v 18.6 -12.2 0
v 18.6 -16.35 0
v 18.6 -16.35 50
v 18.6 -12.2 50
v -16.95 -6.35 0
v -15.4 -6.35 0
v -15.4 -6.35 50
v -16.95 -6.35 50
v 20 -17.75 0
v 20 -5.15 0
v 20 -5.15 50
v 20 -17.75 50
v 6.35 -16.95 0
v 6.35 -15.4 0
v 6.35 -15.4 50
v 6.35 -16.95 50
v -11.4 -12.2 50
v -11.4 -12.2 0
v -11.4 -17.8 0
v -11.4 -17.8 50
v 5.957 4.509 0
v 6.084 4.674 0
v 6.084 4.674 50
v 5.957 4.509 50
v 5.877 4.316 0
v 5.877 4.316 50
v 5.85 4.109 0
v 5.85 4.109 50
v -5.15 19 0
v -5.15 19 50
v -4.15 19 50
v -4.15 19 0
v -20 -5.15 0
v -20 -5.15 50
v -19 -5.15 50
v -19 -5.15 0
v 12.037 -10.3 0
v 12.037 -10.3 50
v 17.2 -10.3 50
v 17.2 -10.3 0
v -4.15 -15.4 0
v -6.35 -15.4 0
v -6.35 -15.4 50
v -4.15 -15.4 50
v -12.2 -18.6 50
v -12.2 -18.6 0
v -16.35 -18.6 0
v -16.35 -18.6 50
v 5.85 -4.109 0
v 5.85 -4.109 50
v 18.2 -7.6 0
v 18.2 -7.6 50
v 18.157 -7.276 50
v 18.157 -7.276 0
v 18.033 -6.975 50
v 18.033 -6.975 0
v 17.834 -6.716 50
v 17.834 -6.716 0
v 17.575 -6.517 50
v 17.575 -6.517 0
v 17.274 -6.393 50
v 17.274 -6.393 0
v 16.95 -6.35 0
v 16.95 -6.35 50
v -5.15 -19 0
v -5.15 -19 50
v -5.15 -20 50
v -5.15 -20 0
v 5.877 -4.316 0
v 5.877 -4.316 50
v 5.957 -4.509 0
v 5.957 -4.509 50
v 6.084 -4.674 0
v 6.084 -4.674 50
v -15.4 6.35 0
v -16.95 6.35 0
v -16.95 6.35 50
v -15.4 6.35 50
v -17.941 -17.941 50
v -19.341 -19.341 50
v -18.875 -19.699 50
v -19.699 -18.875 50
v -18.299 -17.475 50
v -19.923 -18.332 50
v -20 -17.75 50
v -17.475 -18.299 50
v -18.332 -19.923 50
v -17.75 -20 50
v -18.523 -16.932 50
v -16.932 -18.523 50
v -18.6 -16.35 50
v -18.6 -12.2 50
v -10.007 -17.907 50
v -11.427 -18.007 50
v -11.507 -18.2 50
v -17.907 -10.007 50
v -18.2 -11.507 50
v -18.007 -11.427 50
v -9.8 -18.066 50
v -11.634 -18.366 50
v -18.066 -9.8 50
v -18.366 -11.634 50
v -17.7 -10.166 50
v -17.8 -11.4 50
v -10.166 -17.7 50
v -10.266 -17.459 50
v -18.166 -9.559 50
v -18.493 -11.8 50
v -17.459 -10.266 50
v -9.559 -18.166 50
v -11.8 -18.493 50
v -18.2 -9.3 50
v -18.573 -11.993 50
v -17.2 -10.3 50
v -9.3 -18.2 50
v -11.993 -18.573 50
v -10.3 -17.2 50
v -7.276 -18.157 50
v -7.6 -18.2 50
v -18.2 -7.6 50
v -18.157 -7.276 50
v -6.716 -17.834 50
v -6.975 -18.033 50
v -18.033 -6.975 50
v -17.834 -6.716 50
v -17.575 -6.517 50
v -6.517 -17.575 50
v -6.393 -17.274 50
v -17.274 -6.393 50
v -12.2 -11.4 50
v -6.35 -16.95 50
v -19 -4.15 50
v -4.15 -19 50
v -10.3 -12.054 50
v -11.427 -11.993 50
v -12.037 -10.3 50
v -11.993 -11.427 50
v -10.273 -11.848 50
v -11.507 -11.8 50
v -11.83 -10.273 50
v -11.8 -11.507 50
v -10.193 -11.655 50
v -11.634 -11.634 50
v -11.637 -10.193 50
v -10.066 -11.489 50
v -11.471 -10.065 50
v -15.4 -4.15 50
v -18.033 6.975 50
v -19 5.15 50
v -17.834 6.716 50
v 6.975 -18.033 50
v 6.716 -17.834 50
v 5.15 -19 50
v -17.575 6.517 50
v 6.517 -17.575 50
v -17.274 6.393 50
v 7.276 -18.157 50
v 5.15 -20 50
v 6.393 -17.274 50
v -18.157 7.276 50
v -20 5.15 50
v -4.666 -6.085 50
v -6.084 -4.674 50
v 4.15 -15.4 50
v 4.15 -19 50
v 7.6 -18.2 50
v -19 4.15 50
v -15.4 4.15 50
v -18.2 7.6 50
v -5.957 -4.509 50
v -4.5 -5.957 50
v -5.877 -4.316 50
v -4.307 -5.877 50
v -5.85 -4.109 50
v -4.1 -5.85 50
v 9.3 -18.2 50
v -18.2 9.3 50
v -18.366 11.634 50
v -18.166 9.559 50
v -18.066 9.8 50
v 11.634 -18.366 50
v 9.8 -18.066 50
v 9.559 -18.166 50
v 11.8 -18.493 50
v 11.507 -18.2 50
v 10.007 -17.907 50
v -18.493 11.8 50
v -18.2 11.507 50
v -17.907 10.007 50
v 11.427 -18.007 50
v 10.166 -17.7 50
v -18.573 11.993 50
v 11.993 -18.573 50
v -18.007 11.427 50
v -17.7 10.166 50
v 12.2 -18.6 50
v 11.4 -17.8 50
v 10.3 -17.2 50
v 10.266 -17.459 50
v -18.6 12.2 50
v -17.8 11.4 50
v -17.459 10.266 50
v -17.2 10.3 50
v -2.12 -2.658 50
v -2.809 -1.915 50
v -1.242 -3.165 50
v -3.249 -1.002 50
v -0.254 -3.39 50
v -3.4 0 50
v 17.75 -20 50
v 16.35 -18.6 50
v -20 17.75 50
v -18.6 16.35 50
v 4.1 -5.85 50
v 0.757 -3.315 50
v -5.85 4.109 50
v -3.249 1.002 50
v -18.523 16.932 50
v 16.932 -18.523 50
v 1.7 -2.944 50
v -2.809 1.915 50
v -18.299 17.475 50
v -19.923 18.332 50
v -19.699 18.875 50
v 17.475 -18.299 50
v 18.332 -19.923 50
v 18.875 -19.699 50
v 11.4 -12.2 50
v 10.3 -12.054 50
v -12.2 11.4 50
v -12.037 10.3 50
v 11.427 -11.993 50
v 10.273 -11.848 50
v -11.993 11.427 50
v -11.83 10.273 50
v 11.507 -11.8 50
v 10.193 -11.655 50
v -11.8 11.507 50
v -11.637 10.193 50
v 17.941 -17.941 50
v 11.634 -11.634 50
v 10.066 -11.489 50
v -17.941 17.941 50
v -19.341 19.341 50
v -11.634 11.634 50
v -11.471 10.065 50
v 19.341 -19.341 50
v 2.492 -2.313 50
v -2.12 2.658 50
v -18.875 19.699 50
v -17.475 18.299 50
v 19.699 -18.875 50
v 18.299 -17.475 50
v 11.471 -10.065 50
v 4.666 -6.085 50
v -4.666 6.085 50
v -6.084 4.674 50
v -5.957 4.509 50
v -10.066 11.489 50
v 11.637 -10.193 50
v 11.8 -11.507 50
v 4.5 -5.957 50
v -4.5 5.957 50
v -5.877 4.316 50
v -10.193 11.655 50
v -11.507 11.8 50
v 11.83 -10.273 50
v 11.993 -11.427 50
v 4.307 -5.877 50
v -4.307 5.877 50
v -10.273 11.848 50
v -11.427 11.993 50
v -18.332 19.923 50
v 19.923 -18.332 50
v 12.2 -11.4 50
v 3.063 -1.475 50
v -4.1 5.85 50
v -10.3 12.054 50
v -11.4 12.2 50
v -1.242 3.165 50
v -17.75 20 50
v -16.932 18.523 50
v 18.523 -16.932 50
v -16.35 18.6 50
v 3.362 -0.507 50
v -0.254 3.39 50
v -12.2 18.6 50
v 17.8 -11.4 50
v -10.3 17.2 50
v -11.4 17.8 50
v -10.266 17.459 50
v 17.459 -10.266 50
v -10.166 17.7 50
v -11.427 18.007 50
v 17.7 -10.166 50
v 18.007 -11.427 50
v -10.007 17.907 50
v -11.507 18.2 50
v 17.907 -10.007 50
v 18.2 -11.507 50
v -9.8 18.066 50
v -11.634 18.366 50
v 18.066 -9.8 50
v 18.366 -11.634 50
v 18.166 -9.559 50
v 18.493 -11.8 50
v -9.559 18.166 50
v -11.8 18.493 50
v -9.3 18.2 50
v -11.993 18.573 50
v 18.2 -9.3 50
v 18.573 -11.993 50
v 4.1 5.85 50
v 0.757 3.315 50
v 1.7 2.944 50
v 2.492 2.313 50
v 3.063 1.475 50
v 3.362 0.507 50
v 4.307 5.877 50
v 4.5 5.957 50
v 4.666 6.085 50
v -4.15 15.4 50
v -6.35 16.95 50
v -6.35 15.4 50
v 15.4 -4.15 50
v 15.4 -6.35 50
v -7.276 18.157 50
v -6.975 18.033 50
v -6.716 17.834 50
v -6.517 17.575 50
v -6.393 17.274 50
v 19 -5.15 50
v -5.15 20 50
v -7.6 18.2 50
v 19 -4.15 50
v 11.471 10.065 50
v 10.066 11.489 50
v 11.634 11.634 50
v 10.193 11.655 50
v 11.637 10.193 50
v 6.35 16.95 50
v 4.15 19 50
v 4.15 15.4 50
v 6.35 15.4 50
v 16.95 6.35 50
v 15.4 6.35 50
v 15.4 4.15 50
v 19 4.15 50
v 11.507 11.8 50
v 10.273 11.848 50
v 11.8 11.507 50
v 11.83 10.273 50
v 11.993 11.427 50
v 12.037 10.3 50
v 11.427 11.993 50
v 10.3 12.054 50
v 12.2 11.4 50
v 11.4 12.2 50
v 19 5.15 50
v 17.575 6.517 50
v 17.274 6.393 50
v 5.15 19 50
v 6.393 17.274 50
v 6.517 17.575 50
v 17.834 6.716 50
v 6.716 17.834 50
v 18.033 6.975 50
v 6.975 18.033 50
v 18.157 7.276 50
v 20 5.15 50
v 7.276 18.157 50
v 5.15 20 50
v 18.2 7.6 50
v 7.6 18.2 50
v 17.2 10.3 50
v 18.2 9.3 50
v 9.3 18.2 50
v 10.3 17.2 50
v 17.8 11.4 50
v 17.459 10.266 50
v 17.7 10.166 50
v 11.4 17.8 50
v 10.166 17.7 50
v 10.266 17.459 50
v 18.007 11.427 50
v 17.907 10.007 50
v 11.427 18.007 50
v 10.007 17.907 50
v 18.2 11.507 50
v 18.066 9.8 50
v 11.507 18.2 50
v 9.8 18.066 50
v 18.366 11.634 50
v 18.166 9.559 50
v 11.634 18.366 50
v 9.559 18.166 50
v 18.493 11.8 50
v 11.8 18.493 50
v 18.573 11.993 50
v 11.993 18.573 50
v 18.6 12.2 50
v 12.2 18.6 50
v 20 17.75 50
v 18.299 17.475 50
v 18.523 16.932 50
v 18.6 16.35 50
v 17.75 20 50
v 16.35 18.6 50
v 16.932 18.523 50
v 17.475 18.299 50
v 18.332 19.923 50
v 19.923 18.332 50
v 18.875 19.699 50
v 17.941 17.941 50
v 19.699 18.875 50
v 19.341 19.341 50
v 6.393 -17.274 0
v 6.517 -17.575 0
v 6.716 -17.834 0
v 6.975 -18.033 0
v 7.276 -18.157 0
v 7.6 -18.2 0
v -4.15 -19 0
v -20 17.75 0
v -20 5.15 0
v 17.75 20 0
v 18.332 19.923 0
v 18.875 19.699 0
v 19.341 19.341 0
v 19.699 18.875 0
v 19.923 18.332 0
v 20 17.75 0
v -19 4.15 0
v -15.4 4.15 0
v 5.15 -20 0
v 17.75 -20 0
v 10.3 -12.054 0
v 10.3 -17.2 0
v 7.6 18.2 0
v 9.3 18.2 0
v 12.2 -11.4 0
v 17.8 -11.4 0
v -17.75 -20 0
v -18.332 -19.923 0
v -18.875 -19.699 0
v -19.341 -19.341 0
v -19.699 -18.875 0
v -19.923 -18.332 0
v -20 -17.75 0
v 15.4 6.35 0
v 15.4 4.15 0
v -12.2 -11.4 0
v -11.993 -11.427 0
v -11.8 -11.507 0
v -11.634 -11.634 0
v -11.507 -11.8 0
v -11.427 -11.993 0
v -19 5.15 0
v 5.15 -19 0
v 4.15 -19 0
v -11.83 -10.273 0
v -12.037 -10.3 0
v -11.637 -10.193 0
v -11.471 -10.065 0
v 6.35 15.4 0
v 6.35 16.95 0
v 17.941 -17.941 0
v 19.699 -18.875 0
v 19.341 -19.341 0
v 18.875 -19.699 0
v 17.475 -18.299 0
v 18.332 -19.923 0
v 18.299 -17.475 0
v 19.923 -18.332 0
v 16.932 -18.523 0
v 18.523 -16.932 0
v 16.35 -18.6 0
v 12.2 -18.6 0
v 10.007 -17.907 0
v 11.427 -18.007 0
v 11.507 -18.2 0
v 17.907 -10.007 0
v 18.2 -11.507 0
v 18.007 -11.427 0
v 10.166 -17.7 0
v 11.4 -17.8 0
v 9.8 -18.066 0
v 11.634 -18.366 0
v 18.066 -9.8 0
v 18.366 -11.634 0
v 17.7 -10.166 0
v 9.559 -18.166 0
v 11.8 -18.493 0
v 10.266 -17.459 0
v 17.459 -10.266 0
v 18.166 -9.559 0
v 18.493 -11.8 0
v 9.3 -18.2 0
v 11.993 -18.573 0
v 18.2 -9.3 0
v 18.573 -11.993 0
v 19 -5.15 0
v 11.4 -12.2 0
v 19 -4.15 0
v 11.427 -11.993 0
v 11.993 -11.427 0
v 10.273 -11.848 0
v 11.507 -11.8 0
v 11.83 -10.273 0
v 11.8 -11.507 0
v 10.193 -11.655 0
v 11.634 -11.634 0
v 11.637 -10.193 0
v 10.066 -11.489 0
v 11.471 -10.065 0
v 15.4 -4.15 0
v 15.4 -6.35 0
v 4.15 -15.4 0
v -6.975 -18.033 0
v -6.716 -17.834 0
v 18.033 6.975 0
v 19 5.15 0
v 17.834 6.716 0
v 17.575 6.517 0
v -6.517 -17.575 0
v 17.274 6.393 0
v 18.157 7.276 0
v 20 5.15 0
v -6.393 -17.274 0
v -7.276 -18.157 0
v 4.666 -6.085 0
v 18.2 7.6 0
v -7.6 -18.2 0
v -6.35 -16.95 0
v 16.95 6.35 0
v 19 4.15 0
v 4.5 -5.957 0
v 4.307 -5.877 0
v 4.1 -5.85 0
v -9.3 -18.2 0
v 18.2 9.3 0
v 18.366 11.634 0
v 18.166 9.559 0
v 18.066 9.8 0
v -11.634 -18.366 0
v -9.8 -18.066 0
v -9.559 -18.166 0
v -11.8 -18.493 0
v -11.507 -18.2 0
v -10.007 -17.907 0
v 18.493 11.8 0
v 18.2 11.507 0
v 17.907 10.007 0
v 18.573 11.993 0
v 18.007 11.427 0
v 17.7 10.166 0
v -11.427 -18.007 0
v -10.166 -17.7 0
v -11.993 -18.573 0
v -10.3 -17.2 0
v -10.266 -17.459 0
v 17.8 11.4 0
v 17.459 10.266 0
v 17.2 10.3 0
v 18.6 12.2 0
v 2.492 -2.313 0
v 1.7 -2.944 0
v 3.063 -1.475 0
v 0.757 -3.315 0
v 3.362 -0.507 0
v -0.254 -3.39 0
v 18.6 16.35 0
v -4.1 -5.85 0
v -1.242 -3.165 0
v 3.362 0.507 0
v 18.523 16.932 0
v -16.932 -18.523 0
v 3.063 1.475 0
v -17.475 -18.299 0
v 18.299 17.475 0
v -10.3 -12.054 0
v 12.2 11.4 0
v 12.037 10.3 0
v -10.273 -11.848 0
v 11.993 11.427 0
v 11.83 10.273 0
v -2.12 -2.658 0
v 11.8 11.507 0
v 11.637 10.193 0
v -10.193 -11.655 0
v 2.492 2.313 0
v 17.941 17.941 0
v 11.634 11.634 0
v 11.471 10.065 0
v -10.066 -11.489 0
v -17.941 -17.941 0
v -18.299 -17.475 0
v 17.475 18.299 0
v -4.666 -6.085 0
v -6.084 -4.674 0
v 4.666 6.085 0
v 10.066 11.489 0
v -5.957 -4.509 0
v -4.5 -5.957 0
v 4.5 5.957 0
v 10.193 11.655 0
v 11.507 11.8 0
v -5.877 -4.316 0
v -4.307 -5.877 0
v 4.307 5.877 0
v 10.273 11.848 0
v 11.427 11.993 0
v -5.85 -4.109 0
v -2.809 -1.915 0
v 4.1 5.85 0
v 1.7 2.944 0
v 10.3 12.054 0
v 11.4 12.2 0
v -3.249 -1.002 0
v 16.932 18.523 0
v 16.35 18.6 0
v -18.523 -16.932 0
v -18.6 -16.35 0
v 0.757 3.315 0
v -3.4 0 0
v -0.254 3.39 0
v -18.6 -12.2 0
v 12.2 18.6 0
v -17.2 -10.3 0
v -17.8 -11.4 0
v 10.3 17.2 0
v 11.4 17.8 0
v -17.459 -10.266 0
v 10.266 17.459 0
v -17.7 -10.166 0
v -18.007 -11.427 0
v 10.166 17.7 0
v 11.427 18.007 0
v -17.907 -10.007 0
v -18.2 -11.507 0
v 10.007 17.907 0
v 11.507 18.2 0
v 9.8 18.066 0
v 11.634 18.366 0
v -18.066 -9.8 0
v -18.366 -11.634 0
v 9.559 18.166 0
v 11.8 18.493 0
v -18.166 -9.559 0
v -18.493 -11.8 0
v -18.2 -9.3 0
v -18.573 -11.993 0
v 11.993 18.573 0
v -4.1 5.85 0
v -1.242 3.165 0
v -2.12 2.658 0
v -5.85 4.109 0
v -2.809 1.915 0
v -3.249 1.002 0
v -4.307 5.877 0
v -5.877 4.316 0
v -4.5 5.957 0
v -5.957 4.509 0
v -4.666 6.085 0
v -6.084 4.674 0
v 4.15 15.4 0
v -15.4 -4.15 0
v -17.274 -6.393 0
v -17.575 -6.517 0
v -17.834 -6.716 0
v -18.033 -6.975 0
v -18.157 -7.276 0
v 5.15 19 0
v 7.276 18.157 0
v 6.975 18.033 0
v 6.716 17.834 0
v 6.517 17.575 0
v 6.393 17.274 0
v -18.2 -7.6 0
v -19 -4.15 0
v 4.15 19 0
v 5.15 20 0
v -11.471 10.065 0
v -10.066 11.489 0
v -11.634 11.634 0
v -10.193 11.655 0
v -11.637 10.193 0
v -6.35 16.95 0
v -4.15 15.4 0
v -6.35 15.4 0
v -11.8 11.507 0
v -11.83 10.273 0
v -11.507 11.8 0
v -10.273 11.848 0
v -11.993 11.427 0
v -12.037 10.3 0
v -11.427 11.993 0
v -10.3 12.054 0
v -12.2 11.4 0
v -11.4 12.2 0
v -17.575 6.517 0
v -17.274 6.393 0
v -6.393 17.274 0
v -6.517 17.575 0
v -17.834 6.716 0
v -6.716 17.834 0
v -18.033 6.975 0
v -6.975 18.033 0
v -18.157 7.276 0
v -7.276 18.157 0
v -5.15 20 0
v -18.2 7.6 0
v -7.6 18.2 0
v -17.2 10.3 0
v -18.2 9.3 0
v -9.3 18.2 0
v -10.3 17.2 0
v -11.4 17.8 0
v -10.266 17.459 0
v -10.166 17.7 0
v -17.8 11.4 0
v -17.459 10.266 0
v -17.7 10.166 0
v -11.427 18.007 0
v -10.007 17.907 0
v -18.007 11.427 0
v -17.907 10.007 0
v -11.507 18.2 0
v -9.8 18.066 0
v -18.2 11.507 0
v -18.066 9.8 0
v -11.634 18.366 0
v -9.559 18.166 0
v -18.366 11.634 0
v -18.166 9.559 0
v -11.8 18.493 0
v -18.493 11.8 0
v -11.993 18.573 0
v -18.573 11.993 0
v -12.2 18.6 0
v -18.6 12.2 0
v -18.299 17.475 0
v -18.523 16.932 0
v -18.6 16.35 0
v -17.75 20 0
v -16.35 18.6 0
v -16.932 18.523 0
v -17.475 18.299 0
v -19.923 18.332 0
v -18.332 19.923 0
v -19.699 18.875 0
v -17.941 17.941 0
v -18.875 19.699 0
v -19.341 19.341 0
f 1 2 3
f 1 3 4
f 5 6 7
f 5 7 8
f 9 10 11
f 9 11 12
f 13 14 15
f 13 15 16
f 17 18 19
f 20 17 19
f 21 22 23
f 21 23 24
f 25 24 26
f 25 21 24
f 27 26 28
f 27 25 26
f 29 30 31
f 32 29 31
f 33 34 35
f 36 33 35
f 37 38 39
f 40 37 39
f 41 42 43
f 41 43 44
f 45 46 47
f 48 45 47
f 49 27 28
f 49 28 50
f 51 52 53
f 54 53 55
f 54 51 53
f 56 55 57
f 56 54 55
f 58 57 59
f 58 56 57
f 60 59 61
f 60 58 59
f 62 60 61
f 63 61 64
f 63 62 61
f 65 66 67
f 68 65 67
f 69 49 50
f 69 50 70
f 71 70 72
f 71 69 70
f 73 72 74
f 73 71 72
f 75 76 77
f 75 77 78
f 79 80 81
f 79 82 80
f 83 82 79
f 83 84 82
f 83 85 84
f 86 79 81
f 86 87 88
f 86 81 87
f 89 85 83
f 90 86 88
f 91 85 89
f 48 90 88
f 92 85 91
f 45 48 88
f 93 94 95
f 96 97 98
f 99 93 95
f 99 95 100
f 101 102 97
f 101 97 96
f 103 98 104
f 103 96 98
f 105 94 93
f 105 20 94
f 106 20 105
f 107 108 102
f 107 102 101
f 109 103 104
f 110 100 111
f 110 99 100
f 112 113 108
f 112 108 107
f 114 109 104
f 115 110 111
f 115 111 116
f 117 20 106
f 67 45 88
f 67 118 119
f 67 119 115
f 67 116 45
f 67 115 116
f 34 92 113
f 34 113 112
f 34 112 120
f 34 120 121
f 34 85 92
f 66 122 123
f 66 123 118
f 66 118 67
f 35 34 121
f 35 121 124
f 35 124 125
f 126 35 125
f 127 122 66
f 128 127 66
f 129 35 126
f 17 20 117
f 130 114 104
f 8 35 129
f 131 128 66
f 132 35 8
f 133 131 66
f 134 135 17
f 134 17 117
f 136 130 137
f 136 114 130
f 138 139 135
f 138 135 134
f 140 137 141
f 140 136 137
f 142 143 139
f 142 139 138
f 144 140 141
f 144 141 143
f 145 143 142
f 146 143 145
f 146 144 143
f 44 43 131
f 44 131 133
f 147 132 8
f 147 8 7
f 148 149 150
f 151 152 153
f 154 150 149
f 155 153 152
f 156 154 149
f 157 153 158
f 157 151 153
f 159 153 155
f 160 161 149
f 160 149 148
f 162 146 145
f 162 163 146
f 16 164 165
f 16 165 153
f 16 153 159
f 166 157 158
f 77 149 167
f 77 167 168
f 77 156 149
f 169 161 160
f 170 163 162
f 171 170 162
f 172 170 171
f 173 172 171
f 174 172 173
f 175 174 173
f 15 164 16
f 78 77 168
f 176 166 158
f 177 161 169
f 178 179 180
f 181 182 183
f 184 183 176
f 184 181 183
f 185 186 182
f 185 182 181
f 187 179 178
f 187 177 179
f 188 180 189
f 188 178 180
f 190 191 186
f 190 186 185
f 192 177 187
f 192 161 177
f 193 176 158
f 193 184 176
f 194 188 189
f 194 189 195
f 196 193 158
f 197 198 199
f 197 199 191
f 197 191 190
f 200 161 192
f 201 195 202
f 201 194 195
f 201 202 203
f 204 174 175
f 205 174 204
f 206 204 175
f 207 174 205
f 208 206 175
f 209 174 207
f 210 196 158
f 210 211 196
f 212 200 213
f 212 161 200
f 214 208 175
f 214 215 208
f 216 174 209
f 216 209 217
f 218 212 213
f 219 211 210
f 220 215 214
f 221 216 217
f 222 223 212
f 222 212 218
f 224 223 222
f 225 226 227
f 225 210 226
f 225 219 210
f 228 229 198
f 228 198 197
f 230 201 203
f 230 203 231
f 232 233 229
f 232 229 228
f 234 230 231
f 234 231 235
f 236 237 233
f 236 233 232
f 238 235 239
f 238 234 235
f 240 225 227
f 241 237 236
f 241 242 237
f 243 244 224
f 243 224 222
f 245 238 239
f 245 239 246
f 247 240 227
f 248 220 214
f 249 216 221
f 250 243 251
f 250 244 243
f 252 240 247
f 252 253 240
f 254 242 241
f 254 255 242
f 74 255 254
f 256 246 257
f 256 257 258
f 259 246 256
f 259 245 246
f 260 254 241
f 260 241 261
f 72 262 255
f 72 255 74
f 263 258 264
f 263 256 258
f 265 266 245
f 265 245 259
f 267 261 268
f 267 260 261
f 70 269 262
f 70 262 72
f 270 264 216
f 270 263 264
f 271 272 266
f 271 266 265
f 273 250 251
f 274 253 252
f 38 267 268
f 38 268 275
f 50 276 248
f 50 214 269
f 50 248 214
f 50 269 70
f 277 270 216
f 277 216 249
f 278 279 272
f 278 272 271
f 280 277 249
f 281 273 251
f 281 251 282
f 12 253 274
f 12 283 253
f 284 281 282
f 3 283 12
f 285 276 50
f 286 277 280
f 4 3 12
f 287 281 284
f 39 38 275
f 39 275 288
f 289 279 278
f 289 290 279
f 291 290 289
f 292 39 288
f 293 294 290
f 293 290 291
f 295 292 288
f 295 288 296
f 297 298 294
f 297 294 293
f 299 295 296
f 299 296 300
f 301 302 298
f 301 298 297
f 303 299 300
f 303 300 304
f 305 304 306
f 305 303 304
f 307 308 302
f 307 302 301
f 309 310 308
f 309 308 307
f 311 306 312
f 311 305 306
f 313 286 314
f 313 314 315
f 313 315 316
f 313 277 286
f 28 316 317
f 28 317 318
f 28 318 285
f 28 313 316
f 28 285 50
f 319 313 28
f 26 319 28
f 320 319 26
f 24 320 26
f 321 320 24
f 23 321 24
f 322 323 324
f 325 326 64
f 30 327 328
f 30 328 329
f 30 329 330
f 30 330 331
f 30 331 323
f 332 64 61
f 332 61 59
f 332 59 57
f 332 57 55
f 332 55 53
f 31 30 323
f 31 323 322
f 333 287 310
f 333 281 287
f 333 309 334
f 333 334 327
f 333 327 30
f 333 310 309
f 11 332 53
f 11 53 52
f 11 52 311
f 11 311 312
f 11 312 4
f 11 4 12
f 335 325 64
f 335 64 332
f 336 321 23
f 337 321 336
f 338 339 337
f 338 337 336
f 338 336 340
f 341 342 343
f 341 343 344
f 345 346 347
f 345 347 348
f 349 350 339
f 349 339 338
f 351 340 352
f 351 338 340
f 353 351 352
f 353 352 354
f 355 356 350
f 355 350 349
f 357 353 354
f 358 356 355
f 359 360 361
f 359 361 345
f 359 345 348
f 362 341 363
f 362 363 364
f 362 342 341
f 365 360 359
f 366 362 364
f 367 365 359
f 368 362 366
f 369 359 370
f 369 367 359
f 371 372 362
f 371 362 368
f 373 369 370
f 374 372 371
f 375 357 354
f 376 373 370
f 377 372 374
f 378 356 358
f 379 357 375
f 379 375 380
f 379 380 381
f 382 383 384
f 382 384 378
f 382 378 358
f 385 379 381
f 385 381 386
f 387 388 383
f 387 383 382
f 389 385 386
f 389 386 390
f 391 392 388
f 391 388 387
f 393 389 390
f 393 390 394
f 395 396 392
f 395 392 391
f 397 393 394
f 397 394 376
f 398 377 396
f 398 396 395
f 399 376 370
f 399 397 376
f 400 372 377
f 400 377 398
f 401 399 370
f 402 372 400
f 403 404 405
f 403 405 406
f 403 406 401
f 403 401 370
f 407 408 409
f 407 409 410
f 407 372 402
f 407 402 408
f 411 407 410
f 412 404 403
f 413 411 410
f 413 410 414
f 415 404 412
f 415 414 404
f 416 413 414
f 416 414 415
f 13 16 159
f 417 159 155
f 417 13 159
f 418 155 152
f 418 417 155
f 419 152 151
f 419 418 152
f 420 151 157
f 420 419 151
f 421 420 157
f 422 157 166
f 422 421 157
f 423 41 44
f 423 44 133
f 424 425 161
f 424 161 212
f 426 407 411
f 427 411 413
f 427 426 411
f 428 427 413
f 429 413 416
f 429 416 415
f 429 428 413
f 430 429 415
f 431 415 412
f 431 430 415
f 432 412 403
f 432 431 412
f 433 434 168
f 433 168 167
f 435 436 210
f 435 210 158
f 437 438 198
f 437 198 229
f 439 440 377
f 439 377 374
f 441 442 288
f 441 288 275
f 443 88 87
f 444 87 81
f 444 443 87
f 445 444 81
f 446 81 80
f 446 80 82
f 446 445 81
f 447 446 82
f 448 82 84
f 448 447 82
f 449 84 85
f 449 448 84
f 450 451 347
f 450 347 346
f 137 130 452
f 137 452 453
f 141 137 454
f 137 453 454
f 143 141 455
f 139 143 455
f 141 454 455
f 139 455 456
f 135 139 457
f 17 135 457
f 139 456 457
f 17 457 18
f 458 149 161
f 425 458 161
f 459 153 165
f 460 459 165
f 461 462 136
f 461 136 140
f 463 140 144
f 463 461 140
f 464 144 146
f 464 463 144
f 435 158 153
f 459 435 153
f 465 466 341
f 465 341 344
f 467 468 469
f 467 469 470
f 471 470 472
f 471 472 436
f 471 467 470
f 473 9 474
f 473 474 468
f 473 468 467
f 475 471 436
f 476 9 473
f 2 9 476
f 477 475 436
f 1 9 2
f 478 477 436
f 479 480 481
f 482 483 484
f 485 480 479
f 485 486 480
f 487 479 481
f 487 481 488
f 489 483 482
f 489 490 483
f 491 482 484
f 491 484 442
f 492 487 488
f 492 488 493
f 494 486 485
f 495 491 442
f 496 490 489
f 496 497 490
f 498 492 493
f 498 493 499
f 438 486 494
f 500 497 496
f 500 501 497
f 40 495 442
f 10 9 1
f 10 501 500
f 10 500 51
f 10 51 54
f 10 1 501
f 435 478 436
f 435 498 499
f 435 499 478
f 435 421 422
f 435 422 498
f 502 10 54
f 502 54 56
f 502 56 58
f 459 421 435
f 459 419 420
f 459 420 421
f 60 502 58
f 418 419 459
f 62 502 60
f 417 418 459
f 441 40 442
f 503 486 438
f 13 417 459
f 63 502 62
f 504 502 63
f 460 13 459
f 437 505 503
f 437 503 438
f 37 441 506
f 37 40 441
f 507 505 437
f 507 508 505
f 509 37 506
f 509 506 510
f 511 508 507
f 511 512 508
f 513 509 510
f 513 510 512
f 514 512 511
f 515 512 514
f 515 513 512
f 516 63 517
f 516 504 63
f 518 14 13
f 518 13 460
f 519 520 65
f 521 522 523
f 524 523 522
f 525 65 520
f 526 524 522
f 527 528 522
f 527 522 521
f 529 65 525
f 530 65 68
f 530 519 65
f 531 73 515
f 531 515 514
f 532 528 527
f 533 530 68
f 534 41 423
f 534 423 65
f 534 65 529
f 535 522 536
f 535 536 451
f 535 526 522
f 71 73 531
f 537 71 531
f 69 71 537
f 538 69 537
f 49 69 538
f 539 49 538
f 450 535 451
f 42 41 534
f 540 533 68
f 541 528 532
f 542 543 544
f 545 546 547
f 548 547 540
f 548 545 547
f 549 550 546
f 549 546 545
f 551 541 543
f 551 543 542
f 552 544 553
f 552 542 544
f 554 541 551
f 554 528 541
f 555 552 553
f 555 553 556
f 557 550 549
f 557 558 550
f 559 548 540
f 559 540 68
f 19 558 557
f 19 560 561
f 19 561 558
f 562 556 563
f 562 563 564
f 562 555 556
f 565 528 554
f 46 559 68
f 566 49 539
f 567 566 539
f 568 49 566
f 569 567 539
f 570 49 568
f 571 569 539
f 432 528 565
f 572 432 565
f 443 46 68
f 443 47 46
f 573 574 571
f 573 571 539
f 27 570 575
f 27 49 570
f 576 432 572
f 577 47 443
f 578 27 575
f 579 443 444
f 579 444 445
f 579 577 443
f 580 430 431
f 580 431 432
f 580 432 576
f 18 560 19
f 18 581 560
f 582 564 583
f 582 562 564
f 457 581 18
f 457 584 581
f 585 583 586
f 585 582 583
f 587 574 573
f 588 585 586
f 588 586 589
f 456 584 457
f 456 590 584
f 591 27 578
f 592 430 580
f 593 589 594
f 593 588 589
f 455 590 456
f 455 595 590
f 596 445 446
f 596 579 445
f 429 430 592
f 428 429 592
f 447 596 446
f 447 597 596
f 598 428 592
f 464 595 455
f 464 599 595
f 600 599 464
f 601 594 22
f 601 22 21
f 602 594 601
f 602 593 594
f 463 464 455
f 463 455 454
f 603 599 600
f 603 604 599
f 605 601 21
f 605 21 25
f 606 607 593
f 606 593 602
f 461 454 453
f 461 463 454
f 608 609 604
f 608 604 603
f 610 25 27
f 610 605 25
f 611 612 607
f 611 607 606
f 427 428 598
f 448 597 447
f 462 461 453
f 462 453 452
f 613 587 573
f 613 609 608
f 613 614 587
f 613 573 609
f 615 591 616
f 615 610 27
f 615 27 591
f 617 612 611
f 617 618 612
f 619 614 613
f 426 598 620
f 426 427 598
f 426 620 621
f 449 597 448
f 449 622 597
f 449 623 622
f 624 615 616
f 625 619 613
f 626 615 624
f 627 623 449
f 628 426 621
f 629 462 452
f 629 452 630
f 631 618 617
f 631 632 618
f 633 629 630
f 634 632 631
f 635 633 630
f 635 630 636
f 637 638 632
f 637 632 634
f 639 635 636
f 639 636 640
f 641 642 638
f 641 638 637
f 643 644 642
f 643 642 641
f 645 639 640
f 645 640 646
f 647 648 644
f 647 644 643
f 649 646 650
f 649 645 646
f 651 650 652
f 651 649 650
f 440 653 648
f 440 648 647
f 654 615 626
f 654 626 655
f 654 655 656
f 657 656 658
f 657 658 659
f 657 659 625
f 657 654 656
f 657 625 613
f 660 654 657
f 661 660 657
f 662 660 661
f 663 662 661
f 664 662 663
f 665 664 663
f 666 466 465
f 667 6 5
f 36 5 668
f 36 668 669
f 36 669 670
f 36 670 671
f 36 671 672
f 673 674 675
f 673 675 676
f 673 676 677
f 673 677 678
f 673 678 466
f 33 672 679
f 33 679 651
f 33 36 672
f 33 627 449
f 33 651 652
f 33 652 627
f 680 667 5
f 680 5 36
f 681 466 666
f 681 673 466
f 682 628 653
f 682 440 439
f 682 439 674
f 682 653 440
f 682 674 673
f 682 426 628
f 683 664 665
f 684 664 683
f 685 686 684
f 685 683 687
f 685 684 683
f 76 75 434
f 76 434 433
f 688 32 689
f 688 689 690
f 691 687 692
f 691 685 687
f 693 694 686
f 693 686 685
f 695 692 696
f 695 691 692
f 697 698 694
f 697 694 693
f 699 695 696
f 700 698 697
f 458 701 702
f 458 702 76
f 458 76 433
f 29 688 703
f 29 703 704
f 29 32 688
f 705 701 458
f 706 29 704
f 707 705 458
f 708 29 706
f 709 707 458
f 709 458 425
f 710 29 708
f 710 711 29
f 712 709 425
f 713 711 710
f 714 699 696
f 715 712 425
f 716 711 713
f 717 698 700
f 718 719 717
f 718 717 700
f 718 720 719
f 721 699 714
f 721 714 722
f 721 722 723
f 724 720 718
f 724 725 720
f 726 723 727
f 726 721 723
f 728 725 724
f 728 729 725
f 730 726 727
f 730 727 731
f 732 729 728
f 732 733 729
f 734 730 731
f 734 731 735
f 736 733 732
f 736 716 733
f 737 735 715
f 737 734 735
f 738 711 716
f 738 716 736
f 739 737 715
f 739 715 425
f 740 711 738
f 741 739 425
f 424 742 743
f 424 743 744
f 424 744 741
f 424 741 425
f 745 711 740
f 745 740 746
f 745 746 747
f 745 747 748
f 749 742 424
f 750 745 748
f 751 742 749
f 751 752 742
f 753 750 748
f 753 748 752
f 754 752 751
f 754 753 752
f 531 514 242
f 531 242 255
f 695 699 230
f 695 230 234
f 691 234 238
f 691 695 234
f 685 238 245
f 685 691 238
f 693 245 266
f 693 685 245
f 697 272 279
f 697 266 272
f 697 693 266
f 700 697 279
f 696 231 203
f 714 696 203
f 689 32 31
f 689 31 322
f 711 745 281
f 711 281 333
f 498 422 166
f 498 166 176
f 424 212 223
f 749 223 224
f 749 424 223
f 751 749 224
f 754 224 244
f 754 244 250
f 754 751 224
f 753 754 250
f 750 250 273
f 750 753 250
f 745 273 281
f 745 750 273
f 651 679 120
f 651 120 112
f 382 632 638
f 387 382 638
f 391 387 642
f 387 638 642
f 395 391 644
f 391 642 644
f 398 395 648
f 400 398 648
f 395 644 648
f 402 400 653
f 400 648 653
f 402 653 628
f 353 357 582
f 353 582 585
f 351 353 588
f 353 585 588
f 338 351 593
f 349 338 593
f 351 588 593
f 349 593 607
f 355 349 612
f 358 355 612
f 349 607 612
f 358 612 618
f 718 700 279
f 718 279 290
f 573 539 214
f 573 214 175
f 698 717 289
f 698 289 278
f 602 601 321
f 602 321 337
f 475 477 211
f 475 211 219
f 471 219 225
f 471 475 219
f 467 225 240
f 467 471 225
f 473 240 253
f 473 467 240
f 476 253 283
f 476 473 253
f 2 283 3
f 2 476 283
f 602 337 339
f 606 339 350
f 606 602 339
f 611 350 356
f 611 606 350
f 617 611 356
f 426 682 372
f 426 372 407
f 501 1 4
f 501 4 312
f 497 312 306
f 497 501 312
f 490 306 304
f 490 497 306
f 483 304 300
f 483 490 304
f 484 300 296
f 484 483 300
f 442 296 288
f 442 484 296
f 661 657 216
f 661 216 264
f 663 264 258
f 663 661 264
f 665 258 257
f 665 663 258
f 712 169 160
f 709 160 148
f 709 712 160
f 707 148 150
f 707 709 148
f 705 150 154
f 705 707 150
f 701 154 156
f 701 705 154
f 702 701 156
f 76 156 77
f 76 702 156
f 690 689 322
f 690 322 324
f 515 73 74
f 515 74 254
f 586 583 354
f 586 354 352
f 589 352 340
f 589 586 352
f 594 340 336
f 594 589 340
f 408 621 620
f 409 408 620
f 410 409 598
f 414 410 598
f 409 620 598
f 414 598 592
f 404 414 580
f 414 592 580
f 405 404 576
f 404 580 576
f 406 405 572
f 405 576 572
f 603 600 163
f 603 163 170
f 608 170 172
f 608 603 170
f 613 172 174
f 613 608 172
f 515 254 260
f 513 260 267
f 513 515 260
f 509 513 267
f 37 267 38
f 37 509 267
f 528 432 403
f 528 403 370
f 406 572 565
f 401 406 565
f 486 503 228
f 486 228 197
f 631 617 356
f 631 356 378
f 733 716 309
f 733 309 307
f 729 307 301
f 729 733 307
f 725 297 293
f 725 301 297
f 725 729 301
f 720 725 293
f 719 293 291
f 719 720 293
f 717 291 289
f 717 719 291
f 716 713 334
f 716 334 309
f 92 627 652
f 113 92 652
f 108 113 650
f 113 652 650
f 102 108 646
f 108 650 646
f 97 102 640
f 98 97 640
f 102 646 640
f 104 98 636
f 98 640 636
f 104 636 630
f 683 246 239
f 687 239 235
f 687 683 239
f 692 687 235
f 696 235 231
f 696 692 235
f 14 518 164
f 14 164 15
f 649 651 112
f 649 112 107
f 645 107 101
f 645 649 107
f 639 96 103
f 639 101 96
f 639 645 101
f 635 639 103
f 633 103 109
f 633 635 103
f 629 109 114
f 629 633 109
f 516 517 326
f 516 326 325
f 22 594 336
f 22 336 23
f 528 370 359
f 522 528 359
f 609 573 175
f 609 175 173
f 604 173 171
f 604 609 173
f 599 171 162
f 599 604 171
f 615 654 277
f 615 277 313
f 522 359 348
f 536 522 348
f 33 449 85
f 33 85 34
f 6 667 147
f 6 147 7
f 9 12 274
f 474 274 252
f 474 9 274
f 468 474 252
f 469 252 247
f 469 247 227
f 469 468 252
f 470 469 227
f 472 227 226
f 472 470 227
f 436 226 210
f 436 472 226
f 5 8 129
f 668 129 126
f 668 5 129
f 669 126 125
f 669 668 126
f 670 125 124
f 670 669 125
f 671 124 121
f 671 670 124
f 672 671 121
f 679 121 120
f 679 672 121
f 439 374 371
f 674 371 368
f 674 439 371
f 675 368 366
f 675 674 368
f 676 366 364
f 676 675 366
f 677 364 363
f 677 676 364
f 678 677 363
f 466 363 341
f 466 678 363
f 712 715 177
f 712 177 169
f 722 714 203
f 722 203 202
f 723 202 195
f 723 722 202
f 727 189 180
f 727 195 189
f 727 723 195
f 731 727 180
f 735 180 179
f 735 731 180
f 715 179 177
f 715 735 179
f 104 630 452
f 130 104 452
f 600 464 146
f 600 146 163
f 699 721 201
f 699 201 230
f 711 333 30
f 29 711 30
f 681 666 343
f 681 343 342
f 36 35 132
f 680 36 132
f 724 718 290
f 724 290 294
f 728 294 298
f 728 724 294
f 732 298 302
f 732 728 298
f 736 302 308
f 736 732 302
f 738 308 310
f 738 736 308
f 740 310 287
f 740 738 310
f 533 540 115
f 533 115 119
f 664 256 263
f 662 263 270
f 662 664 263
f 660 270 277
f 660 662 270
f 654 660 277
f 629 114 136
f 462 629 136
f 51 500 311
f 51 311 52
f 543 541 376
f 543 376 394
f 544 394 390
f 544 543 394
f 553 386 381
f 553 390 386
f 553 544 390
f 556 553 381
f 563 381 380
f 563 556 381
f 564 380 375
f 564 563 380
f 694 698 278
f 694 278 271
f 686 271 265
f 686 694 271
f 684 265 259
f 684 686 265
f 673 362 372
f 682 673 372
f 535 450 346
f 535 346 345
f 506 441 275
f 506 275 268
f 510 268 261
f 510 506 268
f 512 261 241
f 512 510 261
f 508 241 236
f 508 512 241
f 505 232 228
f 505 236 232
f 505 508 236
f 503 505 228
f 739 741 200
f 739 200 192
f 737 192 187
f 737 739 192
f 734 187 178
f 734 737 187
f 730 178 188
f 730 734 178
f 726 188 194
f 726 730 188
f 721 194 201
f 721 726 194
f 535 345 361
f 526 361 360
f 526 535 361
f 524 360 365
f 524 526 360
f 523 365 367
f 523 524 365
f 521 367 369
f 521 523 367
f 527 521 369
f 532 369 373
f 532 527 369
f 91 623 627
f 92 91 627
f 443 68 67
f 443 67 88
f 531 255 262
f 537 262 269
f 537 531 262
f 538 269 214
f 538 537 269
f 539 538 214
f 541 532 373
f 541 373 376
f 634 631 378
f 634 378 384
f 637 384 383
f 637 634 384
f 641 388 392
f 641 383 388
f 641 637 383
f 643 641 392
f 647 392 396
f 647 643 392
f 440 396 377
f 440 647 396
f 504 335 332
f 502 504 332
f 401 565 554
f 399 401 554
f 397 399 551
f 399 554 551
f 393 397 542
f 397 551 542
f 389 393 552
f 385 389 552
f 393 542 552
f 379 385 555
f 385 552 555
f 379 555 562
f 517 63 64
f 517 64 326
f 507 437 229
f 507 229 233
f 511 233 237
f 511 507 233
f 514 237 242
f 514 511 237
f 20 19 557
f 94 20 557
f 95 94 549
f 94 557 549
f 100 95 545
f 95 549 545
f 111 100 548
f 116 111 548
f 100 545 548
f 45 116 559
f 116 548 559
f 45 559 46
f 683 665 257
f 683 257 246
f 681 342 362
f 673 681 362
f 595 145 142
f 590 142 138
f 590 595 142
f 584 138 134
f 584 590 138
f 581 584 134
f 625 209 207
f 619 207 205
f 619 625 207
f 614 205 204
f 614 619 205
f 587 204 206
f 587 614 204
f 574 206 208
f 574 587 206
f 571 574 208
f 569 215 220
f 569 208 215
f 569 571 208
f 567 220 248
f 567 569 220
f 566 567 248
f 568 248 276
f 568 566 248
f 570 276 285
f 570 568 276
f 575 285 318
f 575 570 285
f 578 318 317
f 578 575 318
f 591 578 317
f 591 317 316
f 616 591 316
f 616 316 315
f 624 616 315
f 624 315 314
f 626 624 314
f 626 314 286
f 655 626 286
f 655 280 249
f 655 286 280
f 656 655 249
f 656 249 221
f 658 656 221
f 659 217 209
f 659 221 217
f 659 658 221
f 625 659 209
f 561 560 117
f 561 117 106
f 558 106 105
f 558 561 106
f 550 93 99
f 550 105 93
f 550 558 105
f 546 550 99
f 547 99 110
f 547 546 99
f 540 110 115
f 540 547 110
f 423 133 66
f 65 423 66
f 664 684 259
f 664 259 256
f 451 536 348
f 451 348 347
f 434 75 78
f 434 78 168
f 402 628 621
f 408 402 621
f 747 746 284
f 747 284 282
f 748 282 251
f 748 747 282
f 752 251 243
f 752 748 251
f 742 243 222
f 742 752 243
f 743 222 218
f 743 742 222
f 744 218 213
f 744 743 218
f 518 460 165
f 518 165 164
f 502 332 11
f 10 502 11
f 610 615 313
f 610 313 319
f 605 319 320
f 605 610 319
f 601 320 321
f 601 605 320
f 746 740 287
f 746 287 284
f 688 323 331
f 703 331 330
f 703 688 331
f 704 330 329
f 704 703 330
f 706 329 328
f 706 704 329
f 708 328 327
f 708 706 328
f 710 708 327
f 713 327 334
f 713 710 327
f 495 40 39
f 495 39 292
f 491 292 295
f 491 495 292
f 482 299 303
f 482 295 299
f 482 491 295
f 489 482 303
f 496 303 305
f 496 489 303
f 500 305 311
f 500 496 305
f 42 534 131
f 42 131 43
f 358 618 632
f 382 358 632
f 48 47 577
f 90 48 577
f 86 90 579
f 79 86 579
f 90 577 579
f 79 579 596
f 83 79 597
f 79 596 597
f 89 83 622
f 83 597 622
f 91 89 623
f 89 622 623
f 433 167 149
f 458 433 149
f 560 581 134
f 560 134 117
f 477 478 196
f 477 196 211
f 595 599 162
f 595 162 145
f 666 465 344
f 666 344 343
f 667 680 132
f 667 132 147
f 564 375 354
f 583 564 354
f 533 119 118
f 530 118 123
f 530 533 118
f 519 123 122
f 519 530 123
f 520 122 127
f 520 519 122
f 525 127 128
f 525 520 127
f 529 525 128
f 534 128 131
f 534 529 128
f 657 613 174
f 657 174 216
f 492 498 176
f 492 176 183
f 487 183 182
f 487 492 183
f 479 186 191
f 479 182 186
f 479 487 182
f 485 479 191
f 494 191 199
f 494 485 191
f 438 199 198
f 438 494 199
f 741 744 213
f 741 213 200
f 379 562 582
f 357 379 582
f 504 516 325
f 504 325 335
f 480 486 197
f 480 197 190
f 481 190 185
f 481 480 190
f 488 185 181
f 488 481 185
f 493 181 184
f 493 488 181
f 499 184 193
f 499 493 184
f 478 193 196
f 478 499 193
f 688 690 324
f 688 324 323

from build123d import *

# Parameters (mm, degrees)
SKETCH1_R           = 3.4
BOSS_EXTRUDE1_DEPTH = 713
SKETCH2_W           = 40
SKETCH2_H           = 113
CUT_EXTRUDE1_DEPTH  = 715.401147815
SKETCH3_W           = 40
SKETCH3_H           = 550
CUT_EXTRUDE2_DEPTH  = 602.66435826


with BuildPart() as part:
    # Sketch1 → Boss-Extrude1 (new body)
    with BuildSketch(Plane.XY):
        with BuildLine():
            Line((20, 17.75), (20, 5.15))
            Line((20, 5.15), (19, 5.15))
            Line((19, 5.15), (19, 4.15))
            Line((19, 4.15), (15.4, 4.15))
            Line((15.4, 4.15), (15.4, 6.35))
            Line((15.4, 6.35), (16.95, 6.35))
            ThreePointArc((16.95, 6.35), (17.833883476, 6.716116524), (18.2, 7.6))
            Line((18.2, 7.6), (18.2, 9.3))
            ThreePointArc((18.2, 9.3), (17.907106781, 10.007106781), (17.2, 10.3))
            Line((17.2, 10.3), (12.03669957, 10.3))
            ThreePointArc((12.03669957, 10.3), (11.73040037, 10.239040459), (11.470780817, 10.065452001))
            Line((11.470780817, 10.065452001), (6.084081247, 4.674305984))
            ThreePointArc((6.084081247, 4.674305984), (5.910833239, 4.414848262), (5.85, 4.108853983))
            Line((5.85, 4.108853983), (5.85, -4.108853983))
            ThreePointArc((5.85, -4.108853983), (5.910833239, -4.414848262), (6.084081247, -4.674305984))
            Line((6.084081247, -4.674305984), (11.470780817, -10.065452001))
            ThreePointArc((11.470780817, -10.065452001), (11.73040037, -10.239040459), (12.03669957, -10.3))
            Line((12.03669957, -10.3), (17.2, -10.3))
            ThreePointArc((17.2, -10.3), (17.907106781, -10.007106781), (18.2, -9.3))
            Line((18.2, -9.3), (18.2, -7.6))
            ThreePointArc((18.2, -7.6), (17.833883476, -6.716116524), (16.95, -6.35))
            Line((16.95, -6.35), (15.4, -6.35))
            Line((15.4, -6.35), (15.4, -4.15))
            Line((15.4, -4.15), (19, -4.15))
            Line((19, -4.15), (19, -5.15))
            Line((19, -5.15), (20, -5.15))
            Line((20, -5.15), (20, -17.75))
            ThreePointArc((20, -17.75), (19.340990258, -19.340990258), (17.75, -20))
            Line((17.75, -20), (5.15, -20))
            Line((5.15, -20), (5.15, -19))
            Line((5.15, -19), (4.15, -19))
            Line((4.15, -19), (4.15, -15.4))
            Line((4.15, -15.4), (6.35, -15.4))
            Line((6.35, -15.4), (6.35, -16.95))
            ThreePointArc((6.35, -16.95), (6.716116524, -17.833883476), (7.6, -18.2))
            Line((7.6, -18.2), (9.3, -18.2))
            ThreePointArc((9.3, -18.2), (10.007106781, -17.907106781), (10.3, -17.2))
            Line((10.3, -17.2), (10.3, -12.054477022))
            ThreePointArc((10.3, -12.054477022), (10.239166761, -11.748482743), (10.065918753, -11.489025021))
            Line((10.065918753, -11.489025021), (4.665899173, -6.084547999))
            ThreePointArc((4.665899173, -6.084547999), (4.406279619, -5.910959541), (4.09998042, -5.85))
            Line((4.09998042, -5.85), (-4.09998042, -5.85))
            ThreePointArc((-4.09998042, -5.85), (-4.406279619, -5.910959541), (-4.665899173, -6.084547999))
            Line((-4.665899173, -6.084547999), (-10.065918753, -11.489025021))
            ThreePointArc((-10.065918753, -11.489025021), (-10.239166761, -11.748482743), (-10.3, -12.054477022))
            Line((-10.3, -12.054477022), (-10.3, -17.2))
            ThreePointArc((-10.3, -17.2), (-10.007106781, -17.907106781), (-9.3, -18.2))
            Line((-9.3, -18.2), (-7.6, -18.2))
            ThreePointArc((-7.6, -18.2), (-6.716116524, -17.833883476), (-6.35, -16.95))
            Line((-6.35, -16.95), (-6.35, -15.4))
            Line((-6.35, -15.4), (-4.15, -15.4))
            Line((-4.15, -15.4), (-4.15, -19))
            Line((-4.15, -19), (-5.15, -19))
            Line((-5.15, -19), (-5.15, -20))
            Line((-5.15, -20), (-17.75, -20))
            ThreePointArc((-17.75, -20), (-19.340990258, -19.340990258), (-20, -17.75))
            Line((-20, -17.75), (-20, -5.15))
            Line((-20, -5.15), (-19, -5.15))
            Line((-19, -5.15), (-19, -4.15))
            Line((-19, -4.15), (-15.4, -4.15))
            Line((-15.4, -4.15), (-15.4, -6.35))
            Line((-15.4, -6.35), (-16.95, -6.35))
            ThreePointArc((-16.95, -6.35), (-17.833883476, -6.716116524), (-18.2, -7.6))
            Line((-18.2, -7.6), (-18.2, -9.3))
            ThreePointArc((-18.2, -9.3), (-17.907106781, -10.007106781), (-17.2, -10.3))
            Line((-17.2, -10.3), (-12.03669957, -10.3))
            ThreePointArc((-12.03669957, -10.3), (-11.73040037, -10.239040459), (-11.470780817, -10.065452001))
            Line((-11.470780817, -10.065452001), (-6.084081247, -4.674305984))
            ThreePointArc((-6.084081247, -4.674305984), (-5.910833239, -4.414848262), (-5.85, -4.108853983))
            Line((-5.85, -4.108853983), (-5.85, 4.108853983))
            ThreePointArc((-5.85, 4.108853983), (-5.910833239, 4.414848262), (-6.084081247, 4.674305984))
            Line((-6.084081247, 4.674305984), (-11.470780817, 10.065452001))
            ThreePointArc((-11.470780817, 10.065452001), (-11.73040037, 10.239040459), (-12.03669957, 10.3))
            Line((-12.03669957, 10.3), (-17.2, 10.3))
            ThreePointArc((-17.2, 10.3), (-17.907106781, 10.007106781), (-18.2, 9.3))
            Line((-18.2, 9.3), (-18.2, 7.6))
            ThreePointArc((-18.2, 7.6), (-17.833883476, 6.716116524), (-16.95, 6.35))
            Line((-16.95, 6.35), (-15.4, 6.35))
            Line((-15.4, 6.35), (-15.4, 4.15))
            Line((-15.4, 4.15), (-19, 4.15))
            Line((-19, 4.15), (-19, 5.15))
            Line((-19, 5.15), (-20, 5.15))
            Line((-20, 5.15), (-20, 17.75))
            ThreePointArc((-20, 17.75), (-19.340990258, 19.340990258), (-17.75, 20))
            Line((-17.75, 20), (-5.15, 20))
            Line((-5.15, 20), (-5.15, 19))
            Line((-5.15, 19), (-4.15, 19))
            Line((-4.15, 19), (-4.15, 15.4))
            Line((-4.15, 15.4), (-6.35, 15.4))
            Line((-6.35, 15.4), (-6.35, 16.95))
            ThreePointArc((-6.35, 16.95), (-6.716116524, 17.833883476), (-7.6, 18.2))
            Line((-7.6, 18.2), (-9.3, 18.2))
            ThreePointArc((-9.3, 18.2), (-10.007106781, 17.907106781), (-10.3, 17.2))
            Line((-10.3, 17.2), (-10.3, 12.054477022))
            ThreePointArc((-10.3, 12.054477022), (-10.239166761, 11.748482743), (-10.065918753, 11.489025021))
            Line((-10.065918753, 11.489025021), (-4.665899173, 6.084547999))
            ThreePointArc((-4.665899173, 6.084547999), (-4.406279619, 5.910959541), (-4.09998042, 5.85))
            Line((-4.09998042, 5.85), (4.09998042, 5.85))
            ThreePointArc((4.09998042, 5.85), (4.406279619, 5.910959541), (4.665899173, 6.084547999))
            Line((4.665899173, 6.084547999), (10.065918753, 11.489025021))
            ThreePointArc((10.065918753, 11.489025021), (10.239166761, 11.748482743), (10.3, 12.054477022))
            Line((10.3, 12.054477022), (10.3, 17.2))
            ThreePointArc((10.3, 17.2), (10.007106781, 17.907106781), (9.3, 18.2))
            Line((9.3, 18.2), (7.6, 18.2))
            ThreePointArc((7.6, 18.2), (6.716116524, 17.833883476), (6.35, 16.95))
            Line((6.35, 16.95), (6.35, 15.4))
            Line((6.35, 15.4), (4.15, 15.4))
            Line((4.15, 15.4), (4.15, 19))
            Line((4.15, 19), (5.15, 19))
            Line((5.15, 19), (5.15, 20))
            Line((5.15, 20), (17.75, 20))
            ThreePointArc((17.75, 20), (19.340990258, 19.340990258), (20, 17.75))
        make_face()
        with Locations(Location((0, 0, 0), (0, 0, 180))):
            Circle(SKETCH1_R, mode=Mode.SUBTRACT)
        with BuildLine():
            Line((18.6, 16.35), (18.6, 12.2))
            ThreePointArc((18.6, 12.2), (18.365685425, 11.634314575), (17.8, 11.4))
            Line((17.8, 11.4), (12.2, 11.4))
            ThreePointArc((12.2, 11.4), (11.634314575, 11.634314575), (11.4, 12.2))
            Line((11.4, 12.2), (11.4, 17.8))
            ThreePointArc((11.4, 17.8), (11.634314575, 18.365685425), (12.2, 18.6))
            Line((12.2, 18.6), (16.35, 18.6))
            ThreePointArc((16.35, 18.6), (17.940990258, 17.940990258), (18.6, 16.35))
        make_face(mode=Mode.SUBTRACT)
        with BuildLine():
            Line((-12.2, 18.6), (-16.35, 18.6))
            ThreePointArc((-16.35, 18.6), (-17.940990258, 17.940990258), (-18.6, 16.35))
            Line((-18.6, 16.35), (-18.6, 12.2))
            ThreePointArc((-18.6, 12.2), (-18.365685425, 11.634314575), (-17.8, 11.4))
            Line((-17.8, 11.4), (-12.2, 11.4))
            ThreePointArc((-12.2, 11.4), (-11.634314575, 11.634314575), (-11.4, 12.2))
            Line((-11.4, 12.2), (-11.4, 17.8))
            ThreePointArc((-11.4, 17.8), (-11.634314575, 18.365685425), (-12.2, 18.6))
        make_face(mode=Mode.SUBTRACT)
        with BuildLine():
            Line((-18.6, -16.35), (-18.6, -12.2))
            ThreePointArc((-18.6, -12.2), (-18.365685425, -11.634314575), (-17.8, -11.4))
            Line((-17.8, -11.4), (-12.2, -11.4))
            ThreePointArc((-12.2, -11.4), (-11.634314575, -11.634314575), (-11.4, -12.2))
            Line((-11.4, -12.2), (-11.4, -17.8))
            ThreePointArc((-11.4, -17.8), (-11.634314575, -18.365685425), (-12.2, -18.6))
            Line((-12.2, -18.6), (-16.35, -18.6))
            ThreePointArc((-16.35, -18.6), (-17.940990258, -17.940990258), (-18.6, -16.35))
        make_face(mode=Mode.SUBTRACT)
        with BuildLine():
            Line((12.2, -18.6), (16.35, -18.6))
            ThreePointArc((16.35, -18.6), (17.940990258, -17.940990258), (18.6, -16.35))
            Line((18.6, -16.35), (18.6, -12.2))
            ThreePointArc((18.6, -12.2), (18.365685425, -11.634314575), (17.8, -11.4))
            Line((17.8, -11.4), (12.2, -11.4))
            ThreePointArc((12.2, -11.4), (11.634314575, -11.634314575), (11.4, -12.2))
            Line((11.4, -12.2), (11.4, -17.8))
            ThreePointArc((11.4, -17.8), (11.634314575, -18.365685425), (12.2, -18.6))
        make_face(mode=Mode.SUBTRACT)
    extrude(amount=BOSS_EXTRUDE1_DEPTH)

    # Sketch2 → Cut-Extrude1 (cut, through all)
    with BuildSketch(Plane(origin=(0, 20, 0), x_dir=(1, 0, 0), z_dir=(0, 1, 0))):
        with Locations((0, -656.5)):
            Rectangle(SKETCH2_W, SKETCH2_H)
    extrude(amount=-CUT_EXTRUDE1_DEPTH, mode=Mode.SUBTRACT)

    # Sketch3 → Cut-Extrude2 (cut, through all)
    with BuildSketch(Plane(origin=(0, 20, 0), x_dir=(1, 0, 0), z_dir=(0, 1, 0))):
        with Locations((0, -325)):
            Rectangle(SKETCH3_W, SKETCH3_H)
    extrude(amount=-CUT_EXTRUDE2_DEPTH, mode=Mode.SUBTRACT)


solid = part.part
